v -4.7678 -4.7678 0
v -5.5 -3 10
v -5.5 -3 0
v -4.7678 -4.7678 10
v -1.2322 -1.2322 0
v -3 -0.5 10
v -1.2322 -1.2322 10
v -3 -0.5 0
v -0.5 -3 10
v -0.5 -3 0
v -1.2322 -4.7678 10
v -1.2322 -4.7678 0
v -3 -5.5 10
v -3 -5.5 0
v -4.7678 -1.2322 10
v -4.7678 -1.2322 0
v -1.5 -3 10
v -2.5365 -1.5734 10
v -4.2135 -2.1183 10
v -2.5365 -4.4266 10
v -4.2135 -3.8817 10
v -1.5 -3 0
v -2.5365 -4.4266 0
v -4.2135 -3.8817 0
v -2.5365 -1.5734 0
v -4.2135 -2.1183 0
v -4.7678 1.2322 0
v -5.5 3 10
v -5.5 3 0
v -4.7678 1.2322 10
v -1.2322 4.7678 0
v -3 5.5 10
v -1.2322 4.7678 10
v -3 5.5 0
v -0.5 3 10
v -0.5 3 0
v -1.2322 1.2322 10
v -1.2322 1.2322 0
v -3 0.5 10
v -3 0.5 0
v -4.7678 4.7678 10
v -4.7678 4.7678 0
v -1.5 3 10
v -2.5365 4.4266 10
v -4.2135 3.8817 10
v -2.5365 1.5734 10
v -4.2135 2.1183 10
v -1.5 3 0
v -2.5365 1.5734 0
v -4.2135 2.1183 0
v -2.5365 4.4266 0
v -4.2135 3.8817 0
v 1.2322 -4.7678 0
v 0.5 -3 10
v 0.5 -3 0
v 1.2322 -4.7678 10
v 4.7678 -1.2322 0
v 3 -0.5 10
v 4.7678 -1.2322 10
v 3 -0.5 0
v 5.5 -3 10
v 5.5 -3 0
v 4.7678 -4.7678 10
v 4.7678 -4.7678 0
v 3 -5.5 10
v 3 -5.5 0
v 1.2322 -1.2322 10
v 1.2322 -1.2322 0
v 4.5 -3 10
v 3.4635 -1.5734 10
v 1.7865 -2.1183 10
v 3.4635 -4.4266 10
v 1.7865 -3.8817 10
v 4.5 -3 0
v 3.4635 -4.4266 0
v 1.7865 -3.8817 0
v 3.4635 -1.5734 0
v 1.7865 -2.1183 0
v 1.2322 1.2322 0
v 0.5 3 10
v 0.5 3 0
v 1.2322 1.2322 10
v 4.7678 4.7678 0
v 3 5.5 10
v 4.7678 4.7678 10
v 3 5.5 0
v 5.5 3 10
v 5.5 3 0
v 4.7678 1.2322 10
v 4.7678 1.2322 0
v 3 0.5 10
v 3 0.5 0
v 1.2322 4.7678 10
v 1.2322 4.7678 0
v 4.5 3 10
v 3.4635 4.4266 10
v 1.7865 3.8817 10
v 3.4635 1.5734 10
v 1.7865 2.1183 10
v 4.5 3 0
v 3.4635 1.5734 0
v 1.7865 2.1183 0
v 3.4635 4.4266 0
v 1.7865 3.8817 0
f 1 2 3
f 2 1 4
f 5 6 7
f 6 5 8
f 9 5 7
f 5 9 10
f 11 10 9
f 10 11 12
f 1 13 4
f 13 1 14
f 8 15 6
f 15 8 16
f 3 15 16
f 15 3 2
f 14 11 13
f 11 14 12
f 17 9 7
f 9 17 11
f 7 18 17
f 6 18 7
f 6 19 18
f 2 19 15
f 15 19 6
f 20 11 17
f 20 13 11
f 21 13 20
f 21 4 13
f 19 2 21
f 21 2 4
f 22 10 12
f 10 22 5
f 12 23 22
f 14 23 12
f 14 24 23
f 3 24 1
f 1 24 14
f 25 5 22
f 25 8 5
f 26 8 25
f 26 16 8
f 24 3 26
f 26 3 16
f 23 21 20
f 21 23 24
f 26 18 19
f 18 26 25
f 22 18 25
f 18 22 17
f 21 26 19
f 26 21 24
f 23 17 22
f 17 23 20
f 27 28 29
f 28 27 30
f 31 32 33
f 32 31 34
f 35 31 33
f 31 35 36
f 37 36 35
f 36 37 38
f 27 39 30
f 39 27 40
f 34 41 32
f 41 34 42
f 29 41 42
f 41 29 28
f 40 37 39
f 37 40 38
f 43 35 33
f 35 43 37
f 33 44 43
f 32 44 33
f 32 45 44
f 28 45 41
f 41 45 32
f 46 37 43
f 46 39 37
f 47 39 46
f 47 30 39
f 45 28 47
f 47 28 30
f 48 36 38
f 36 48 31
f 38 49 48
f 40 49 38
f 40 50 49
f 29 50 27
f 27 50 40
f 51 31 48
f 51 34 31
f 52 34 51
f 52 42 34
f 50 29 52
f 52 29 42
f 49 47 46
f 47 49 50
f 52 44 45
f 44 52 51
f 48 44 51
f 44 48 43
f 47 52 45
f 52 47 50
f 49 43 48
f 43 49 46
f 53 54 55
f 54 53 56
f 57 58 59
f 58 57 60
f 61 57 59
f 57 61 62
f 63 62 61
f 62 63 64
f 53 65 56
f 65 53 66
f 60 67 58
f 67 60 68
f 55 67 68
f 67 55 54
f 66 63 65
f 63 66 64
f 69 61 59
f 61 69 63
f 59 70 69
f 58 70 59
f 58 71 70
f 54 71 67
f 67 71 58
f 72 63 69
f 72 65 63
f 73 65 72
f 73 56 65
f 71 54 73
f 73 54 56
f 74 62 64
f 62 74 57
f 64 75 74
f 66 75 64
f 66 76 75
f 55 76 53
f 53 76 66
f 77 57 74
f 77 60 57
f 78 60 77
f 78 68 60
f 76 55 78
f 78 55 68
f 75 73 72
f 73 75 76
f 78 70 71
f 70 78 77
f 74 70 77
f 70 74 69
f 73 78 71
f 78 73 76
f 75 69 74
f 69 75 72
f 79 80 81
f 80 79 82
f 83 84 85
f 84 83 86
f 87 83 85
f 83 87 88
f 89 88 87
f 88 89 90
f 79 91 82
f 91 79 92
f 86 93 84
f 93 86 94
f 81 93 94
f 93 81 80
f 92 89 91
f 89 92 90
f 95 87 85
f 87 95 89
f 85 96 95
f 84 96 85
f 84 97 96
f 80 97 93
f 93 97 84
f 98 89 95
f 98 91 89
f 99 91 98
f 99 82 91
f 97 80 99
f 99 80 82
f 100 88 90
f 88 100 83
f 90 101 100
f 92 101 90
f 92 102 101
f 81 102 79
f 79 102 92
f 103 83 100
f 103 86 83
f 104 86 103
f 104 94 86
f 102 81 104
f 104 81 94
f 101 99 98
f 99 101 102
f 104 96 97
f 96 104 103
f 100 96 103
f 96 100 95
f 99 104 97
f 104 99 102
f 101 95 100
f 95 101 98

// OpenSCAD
pared=3.5;
diffLado = 8;
fibOpPlug = 12.75;
frenteH = 50+pared;
diffW = 51;
torHemW=8;
fibW=9.5;
torHemOffset = (diffW/2)-
				  (torHemW/2);







portaTornillos();







module portaTornillos(){

translate([-3,-3,0])
tornillo();
translate([-3,3,0])
tornillo();
translate([3,-3,0])
tornillo();
translate([3,3,0])
tornillo();

}


module tornillo(){

difference(){	
cylinder(r=2.5,10);
translate([0,0,-0.1])
cylinder(r=3/2,15+0.1);
}

}
